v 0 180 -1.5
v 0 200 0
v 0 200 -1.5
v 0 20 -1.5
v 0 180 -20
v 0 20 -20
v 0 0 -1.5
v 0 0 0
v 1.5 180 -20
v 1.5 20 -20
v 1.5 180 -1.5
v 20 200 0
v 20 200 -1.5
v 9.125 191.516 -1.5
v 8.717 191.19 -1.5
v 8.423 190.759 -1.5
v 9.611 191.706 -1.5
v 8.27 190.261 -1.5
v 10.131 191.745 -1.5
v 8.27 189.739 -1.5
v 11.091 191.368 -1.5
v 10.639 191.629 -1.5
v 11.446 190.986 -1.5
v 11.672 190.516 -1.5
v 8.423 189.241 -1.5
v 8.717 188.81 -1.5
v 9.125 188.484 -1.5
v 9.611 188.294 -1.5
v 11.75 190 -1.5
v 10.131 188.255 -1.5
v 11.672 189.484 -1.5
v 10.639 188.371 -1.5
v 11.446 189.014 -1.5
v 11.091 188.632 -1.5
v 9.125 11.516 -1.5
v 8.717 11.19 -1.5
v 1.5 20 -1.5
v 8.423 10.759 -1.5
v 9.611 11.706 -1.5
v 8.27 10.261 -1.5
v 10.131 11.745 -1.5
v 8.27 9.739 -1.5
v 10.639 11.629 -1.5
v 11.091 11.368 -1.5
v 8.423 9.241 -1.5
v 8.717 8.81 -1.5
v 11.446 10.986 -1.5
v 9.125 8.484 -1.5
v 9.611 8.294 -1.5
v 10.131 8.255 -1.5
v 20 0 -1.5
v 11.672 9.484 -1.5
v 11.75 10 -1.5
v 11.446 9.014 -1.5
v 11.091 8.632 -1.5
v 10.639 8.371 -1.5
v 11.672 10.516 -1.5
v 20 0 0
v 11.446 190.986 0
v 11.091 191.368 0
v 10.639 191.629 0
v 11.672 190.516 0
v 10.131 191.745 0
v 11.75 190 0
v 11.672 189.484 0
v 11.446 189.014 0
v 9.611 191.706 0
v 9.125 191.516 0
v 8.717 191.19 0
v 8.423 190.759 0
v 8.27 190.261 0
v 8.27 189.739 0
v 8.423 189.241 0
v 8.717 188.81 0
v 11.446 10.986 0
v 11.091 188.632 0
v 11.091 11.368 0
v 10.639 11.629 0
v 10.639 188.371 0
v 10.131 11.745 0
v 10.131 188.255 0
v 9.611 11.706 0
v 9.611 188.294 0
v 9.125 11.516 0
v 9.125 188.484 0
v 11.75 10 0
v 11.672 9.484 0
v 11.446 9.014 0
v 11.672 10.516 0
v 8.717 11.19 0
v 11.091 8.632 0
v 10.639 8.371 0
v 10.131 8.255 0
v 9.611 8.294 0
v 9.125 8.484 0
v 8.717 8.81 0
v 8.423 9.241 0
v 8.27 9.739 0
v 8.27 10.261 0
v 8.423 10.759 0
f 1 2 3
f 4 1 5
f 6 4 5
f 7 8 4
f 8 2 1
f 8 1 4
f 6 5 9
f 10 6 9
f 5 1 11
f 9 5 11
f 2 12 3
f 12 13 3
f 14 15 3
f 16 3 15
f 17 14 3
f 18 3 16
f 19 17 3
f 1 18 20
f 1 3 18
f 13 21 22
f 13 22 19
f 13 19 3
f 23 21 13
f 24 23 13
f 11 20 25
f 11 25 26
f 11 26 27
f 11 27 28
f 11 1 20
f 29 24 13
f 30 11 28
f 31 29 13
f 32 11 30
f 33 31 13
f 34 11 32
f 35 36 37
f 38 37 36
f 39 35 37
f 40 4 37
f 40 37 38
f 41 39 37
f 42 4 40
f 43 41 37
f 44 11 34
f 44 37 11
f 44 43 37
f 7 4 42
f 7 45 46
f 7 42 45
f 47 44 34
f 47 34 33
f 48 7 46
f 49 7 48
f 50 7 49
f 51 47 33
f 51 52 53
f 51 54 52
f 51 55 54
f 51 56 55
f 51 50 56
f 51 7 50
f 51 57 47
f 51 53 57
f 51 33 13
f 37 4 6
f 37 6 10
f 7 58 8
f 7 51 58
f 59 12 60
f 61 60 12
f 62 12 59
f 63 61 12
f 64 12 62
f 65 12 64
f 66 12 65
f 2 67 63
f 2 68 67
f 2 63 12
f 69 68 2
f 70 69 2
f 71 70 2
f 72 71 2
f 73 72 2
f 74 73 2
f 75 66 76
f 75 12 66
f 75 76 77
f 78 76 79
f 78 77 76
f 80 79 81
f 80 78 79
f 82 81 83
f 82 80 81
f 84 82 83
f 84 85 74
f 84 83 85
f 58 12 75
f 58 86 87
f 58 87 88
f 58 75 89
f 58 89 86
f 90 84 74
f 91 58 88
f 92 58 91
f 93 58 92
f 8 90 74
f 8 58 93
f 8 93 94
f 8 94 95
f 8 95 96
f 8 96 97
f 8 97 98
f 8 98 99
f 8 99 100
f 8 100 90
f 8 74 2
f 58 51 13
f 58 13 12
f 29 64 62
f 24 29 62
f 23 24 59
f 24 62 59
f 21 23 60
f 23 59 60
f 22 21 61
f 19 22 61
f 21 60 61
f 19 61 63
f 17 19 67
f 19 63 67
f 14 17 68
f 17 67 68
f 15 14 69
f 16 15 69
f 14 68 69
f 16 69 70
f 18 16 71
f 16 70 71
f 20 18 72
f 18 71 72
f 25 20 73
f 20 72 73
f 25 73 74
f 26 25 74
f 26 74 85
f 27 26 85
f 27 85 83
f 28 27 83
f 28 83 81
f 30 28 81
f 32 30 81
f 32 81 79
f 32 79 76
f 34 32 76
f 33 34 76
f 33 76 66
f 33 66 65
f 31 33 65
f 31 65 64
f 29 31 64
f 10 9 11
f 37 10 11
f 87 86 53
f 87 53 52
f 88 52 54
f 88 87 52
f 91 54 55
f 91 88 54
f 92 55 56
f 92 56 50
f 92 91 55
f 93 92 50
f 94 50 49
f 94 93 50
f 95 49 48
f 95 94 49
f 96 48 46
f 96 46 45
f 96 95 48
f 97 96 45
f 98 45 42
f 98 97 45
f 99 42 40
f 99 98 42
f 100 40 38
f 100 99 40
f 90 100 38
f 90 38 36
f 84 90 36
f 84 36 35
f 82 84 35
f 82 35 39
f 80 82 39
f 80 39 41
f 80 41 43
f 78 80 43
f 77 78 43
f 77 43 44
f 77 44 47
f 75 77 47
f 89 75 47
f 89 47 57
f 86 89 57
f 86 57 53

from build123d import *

# Parameters (mm, degrees)
EXTRUDE_1_DEPTH     = 200
SKETCH_2_W          = 1.5
SKETCH_2_H          = 18.5
CUT_EXTRUDE_1_DEPTH = 20
CUT_EXTRUDE_2_REACH = 203.99
SKETCH_3_R          = 1.75


with BuildPart() as part:
    # Эскиз1 → Бобышка-Вытянуть1 (new body)
    with BuildSketch(Plane(origin=(0, 0, 0), x_dir=(1, 0, 0), z_dir=(0, 1, 0))):
        Polygon((0, 0), (0, 20), (1.5, 20), (1.5, 1.5), (20, 1.5), (20, 0), align=None)
    extrude(amount=EXTRUDE_1_DEPTH)

    # Эскиз2 → Вырез-Вытянуть1 (cut)
    with BuildSketch(Plane(origin=(0, 200, 0), x_dir=(1, 0, 0), z_dir=(0, 1, 0))):
        with Locations((0.75, 10.75)):
            Rectangle(SKETCH_2_W, SKETCH_2_H)
    cut_extrude_1 = extrude(amount=-CUT_EXTRUDE_1_DEPTH, mode=Mode.SUBTRACT)

    # Эскиз3 → Вырез-Вытянуть2 (cut, up to next)
    with BuildSketch(Plane.XY, mode=Mode.PRIVATE) as cut_extrude_2_sk1:
        with Locations((10, 190)):
            Circle(SKETCH_3_R)
    cut_extrude_2_tool1 = extrude(cut_extrude_2_sk1.sketch, amount=-CUT_EXTRUDE_2_REACH, mode=Mode.PRIVATE) & part.part
    cut_extrude_2 = cut_extrude_2_tool1.solids().sort_by_distance((10, 190, 0))[0]
    add(cut_extrude_2, mode=Mode.SUBTRACT)

    # Зеркальное отражение1: Вырез-Вытянуть1, Вырез-Вытянуть2 across plane
    add(cut_extrude_1.mirror(Plane(origin=(0, 100, 0), x_dir=(0, 0, 1), z_dir=(0, -1, 0))), mode=Mode.SUBTRACT)
    add(cut_extrude_2.mirror(Plane(origin=(0, 100, 0), x_dir=(0, 0, 1), z_dir=(0, -1, 0))), mode=Mode.SUBTRACT)


solid = part.part
